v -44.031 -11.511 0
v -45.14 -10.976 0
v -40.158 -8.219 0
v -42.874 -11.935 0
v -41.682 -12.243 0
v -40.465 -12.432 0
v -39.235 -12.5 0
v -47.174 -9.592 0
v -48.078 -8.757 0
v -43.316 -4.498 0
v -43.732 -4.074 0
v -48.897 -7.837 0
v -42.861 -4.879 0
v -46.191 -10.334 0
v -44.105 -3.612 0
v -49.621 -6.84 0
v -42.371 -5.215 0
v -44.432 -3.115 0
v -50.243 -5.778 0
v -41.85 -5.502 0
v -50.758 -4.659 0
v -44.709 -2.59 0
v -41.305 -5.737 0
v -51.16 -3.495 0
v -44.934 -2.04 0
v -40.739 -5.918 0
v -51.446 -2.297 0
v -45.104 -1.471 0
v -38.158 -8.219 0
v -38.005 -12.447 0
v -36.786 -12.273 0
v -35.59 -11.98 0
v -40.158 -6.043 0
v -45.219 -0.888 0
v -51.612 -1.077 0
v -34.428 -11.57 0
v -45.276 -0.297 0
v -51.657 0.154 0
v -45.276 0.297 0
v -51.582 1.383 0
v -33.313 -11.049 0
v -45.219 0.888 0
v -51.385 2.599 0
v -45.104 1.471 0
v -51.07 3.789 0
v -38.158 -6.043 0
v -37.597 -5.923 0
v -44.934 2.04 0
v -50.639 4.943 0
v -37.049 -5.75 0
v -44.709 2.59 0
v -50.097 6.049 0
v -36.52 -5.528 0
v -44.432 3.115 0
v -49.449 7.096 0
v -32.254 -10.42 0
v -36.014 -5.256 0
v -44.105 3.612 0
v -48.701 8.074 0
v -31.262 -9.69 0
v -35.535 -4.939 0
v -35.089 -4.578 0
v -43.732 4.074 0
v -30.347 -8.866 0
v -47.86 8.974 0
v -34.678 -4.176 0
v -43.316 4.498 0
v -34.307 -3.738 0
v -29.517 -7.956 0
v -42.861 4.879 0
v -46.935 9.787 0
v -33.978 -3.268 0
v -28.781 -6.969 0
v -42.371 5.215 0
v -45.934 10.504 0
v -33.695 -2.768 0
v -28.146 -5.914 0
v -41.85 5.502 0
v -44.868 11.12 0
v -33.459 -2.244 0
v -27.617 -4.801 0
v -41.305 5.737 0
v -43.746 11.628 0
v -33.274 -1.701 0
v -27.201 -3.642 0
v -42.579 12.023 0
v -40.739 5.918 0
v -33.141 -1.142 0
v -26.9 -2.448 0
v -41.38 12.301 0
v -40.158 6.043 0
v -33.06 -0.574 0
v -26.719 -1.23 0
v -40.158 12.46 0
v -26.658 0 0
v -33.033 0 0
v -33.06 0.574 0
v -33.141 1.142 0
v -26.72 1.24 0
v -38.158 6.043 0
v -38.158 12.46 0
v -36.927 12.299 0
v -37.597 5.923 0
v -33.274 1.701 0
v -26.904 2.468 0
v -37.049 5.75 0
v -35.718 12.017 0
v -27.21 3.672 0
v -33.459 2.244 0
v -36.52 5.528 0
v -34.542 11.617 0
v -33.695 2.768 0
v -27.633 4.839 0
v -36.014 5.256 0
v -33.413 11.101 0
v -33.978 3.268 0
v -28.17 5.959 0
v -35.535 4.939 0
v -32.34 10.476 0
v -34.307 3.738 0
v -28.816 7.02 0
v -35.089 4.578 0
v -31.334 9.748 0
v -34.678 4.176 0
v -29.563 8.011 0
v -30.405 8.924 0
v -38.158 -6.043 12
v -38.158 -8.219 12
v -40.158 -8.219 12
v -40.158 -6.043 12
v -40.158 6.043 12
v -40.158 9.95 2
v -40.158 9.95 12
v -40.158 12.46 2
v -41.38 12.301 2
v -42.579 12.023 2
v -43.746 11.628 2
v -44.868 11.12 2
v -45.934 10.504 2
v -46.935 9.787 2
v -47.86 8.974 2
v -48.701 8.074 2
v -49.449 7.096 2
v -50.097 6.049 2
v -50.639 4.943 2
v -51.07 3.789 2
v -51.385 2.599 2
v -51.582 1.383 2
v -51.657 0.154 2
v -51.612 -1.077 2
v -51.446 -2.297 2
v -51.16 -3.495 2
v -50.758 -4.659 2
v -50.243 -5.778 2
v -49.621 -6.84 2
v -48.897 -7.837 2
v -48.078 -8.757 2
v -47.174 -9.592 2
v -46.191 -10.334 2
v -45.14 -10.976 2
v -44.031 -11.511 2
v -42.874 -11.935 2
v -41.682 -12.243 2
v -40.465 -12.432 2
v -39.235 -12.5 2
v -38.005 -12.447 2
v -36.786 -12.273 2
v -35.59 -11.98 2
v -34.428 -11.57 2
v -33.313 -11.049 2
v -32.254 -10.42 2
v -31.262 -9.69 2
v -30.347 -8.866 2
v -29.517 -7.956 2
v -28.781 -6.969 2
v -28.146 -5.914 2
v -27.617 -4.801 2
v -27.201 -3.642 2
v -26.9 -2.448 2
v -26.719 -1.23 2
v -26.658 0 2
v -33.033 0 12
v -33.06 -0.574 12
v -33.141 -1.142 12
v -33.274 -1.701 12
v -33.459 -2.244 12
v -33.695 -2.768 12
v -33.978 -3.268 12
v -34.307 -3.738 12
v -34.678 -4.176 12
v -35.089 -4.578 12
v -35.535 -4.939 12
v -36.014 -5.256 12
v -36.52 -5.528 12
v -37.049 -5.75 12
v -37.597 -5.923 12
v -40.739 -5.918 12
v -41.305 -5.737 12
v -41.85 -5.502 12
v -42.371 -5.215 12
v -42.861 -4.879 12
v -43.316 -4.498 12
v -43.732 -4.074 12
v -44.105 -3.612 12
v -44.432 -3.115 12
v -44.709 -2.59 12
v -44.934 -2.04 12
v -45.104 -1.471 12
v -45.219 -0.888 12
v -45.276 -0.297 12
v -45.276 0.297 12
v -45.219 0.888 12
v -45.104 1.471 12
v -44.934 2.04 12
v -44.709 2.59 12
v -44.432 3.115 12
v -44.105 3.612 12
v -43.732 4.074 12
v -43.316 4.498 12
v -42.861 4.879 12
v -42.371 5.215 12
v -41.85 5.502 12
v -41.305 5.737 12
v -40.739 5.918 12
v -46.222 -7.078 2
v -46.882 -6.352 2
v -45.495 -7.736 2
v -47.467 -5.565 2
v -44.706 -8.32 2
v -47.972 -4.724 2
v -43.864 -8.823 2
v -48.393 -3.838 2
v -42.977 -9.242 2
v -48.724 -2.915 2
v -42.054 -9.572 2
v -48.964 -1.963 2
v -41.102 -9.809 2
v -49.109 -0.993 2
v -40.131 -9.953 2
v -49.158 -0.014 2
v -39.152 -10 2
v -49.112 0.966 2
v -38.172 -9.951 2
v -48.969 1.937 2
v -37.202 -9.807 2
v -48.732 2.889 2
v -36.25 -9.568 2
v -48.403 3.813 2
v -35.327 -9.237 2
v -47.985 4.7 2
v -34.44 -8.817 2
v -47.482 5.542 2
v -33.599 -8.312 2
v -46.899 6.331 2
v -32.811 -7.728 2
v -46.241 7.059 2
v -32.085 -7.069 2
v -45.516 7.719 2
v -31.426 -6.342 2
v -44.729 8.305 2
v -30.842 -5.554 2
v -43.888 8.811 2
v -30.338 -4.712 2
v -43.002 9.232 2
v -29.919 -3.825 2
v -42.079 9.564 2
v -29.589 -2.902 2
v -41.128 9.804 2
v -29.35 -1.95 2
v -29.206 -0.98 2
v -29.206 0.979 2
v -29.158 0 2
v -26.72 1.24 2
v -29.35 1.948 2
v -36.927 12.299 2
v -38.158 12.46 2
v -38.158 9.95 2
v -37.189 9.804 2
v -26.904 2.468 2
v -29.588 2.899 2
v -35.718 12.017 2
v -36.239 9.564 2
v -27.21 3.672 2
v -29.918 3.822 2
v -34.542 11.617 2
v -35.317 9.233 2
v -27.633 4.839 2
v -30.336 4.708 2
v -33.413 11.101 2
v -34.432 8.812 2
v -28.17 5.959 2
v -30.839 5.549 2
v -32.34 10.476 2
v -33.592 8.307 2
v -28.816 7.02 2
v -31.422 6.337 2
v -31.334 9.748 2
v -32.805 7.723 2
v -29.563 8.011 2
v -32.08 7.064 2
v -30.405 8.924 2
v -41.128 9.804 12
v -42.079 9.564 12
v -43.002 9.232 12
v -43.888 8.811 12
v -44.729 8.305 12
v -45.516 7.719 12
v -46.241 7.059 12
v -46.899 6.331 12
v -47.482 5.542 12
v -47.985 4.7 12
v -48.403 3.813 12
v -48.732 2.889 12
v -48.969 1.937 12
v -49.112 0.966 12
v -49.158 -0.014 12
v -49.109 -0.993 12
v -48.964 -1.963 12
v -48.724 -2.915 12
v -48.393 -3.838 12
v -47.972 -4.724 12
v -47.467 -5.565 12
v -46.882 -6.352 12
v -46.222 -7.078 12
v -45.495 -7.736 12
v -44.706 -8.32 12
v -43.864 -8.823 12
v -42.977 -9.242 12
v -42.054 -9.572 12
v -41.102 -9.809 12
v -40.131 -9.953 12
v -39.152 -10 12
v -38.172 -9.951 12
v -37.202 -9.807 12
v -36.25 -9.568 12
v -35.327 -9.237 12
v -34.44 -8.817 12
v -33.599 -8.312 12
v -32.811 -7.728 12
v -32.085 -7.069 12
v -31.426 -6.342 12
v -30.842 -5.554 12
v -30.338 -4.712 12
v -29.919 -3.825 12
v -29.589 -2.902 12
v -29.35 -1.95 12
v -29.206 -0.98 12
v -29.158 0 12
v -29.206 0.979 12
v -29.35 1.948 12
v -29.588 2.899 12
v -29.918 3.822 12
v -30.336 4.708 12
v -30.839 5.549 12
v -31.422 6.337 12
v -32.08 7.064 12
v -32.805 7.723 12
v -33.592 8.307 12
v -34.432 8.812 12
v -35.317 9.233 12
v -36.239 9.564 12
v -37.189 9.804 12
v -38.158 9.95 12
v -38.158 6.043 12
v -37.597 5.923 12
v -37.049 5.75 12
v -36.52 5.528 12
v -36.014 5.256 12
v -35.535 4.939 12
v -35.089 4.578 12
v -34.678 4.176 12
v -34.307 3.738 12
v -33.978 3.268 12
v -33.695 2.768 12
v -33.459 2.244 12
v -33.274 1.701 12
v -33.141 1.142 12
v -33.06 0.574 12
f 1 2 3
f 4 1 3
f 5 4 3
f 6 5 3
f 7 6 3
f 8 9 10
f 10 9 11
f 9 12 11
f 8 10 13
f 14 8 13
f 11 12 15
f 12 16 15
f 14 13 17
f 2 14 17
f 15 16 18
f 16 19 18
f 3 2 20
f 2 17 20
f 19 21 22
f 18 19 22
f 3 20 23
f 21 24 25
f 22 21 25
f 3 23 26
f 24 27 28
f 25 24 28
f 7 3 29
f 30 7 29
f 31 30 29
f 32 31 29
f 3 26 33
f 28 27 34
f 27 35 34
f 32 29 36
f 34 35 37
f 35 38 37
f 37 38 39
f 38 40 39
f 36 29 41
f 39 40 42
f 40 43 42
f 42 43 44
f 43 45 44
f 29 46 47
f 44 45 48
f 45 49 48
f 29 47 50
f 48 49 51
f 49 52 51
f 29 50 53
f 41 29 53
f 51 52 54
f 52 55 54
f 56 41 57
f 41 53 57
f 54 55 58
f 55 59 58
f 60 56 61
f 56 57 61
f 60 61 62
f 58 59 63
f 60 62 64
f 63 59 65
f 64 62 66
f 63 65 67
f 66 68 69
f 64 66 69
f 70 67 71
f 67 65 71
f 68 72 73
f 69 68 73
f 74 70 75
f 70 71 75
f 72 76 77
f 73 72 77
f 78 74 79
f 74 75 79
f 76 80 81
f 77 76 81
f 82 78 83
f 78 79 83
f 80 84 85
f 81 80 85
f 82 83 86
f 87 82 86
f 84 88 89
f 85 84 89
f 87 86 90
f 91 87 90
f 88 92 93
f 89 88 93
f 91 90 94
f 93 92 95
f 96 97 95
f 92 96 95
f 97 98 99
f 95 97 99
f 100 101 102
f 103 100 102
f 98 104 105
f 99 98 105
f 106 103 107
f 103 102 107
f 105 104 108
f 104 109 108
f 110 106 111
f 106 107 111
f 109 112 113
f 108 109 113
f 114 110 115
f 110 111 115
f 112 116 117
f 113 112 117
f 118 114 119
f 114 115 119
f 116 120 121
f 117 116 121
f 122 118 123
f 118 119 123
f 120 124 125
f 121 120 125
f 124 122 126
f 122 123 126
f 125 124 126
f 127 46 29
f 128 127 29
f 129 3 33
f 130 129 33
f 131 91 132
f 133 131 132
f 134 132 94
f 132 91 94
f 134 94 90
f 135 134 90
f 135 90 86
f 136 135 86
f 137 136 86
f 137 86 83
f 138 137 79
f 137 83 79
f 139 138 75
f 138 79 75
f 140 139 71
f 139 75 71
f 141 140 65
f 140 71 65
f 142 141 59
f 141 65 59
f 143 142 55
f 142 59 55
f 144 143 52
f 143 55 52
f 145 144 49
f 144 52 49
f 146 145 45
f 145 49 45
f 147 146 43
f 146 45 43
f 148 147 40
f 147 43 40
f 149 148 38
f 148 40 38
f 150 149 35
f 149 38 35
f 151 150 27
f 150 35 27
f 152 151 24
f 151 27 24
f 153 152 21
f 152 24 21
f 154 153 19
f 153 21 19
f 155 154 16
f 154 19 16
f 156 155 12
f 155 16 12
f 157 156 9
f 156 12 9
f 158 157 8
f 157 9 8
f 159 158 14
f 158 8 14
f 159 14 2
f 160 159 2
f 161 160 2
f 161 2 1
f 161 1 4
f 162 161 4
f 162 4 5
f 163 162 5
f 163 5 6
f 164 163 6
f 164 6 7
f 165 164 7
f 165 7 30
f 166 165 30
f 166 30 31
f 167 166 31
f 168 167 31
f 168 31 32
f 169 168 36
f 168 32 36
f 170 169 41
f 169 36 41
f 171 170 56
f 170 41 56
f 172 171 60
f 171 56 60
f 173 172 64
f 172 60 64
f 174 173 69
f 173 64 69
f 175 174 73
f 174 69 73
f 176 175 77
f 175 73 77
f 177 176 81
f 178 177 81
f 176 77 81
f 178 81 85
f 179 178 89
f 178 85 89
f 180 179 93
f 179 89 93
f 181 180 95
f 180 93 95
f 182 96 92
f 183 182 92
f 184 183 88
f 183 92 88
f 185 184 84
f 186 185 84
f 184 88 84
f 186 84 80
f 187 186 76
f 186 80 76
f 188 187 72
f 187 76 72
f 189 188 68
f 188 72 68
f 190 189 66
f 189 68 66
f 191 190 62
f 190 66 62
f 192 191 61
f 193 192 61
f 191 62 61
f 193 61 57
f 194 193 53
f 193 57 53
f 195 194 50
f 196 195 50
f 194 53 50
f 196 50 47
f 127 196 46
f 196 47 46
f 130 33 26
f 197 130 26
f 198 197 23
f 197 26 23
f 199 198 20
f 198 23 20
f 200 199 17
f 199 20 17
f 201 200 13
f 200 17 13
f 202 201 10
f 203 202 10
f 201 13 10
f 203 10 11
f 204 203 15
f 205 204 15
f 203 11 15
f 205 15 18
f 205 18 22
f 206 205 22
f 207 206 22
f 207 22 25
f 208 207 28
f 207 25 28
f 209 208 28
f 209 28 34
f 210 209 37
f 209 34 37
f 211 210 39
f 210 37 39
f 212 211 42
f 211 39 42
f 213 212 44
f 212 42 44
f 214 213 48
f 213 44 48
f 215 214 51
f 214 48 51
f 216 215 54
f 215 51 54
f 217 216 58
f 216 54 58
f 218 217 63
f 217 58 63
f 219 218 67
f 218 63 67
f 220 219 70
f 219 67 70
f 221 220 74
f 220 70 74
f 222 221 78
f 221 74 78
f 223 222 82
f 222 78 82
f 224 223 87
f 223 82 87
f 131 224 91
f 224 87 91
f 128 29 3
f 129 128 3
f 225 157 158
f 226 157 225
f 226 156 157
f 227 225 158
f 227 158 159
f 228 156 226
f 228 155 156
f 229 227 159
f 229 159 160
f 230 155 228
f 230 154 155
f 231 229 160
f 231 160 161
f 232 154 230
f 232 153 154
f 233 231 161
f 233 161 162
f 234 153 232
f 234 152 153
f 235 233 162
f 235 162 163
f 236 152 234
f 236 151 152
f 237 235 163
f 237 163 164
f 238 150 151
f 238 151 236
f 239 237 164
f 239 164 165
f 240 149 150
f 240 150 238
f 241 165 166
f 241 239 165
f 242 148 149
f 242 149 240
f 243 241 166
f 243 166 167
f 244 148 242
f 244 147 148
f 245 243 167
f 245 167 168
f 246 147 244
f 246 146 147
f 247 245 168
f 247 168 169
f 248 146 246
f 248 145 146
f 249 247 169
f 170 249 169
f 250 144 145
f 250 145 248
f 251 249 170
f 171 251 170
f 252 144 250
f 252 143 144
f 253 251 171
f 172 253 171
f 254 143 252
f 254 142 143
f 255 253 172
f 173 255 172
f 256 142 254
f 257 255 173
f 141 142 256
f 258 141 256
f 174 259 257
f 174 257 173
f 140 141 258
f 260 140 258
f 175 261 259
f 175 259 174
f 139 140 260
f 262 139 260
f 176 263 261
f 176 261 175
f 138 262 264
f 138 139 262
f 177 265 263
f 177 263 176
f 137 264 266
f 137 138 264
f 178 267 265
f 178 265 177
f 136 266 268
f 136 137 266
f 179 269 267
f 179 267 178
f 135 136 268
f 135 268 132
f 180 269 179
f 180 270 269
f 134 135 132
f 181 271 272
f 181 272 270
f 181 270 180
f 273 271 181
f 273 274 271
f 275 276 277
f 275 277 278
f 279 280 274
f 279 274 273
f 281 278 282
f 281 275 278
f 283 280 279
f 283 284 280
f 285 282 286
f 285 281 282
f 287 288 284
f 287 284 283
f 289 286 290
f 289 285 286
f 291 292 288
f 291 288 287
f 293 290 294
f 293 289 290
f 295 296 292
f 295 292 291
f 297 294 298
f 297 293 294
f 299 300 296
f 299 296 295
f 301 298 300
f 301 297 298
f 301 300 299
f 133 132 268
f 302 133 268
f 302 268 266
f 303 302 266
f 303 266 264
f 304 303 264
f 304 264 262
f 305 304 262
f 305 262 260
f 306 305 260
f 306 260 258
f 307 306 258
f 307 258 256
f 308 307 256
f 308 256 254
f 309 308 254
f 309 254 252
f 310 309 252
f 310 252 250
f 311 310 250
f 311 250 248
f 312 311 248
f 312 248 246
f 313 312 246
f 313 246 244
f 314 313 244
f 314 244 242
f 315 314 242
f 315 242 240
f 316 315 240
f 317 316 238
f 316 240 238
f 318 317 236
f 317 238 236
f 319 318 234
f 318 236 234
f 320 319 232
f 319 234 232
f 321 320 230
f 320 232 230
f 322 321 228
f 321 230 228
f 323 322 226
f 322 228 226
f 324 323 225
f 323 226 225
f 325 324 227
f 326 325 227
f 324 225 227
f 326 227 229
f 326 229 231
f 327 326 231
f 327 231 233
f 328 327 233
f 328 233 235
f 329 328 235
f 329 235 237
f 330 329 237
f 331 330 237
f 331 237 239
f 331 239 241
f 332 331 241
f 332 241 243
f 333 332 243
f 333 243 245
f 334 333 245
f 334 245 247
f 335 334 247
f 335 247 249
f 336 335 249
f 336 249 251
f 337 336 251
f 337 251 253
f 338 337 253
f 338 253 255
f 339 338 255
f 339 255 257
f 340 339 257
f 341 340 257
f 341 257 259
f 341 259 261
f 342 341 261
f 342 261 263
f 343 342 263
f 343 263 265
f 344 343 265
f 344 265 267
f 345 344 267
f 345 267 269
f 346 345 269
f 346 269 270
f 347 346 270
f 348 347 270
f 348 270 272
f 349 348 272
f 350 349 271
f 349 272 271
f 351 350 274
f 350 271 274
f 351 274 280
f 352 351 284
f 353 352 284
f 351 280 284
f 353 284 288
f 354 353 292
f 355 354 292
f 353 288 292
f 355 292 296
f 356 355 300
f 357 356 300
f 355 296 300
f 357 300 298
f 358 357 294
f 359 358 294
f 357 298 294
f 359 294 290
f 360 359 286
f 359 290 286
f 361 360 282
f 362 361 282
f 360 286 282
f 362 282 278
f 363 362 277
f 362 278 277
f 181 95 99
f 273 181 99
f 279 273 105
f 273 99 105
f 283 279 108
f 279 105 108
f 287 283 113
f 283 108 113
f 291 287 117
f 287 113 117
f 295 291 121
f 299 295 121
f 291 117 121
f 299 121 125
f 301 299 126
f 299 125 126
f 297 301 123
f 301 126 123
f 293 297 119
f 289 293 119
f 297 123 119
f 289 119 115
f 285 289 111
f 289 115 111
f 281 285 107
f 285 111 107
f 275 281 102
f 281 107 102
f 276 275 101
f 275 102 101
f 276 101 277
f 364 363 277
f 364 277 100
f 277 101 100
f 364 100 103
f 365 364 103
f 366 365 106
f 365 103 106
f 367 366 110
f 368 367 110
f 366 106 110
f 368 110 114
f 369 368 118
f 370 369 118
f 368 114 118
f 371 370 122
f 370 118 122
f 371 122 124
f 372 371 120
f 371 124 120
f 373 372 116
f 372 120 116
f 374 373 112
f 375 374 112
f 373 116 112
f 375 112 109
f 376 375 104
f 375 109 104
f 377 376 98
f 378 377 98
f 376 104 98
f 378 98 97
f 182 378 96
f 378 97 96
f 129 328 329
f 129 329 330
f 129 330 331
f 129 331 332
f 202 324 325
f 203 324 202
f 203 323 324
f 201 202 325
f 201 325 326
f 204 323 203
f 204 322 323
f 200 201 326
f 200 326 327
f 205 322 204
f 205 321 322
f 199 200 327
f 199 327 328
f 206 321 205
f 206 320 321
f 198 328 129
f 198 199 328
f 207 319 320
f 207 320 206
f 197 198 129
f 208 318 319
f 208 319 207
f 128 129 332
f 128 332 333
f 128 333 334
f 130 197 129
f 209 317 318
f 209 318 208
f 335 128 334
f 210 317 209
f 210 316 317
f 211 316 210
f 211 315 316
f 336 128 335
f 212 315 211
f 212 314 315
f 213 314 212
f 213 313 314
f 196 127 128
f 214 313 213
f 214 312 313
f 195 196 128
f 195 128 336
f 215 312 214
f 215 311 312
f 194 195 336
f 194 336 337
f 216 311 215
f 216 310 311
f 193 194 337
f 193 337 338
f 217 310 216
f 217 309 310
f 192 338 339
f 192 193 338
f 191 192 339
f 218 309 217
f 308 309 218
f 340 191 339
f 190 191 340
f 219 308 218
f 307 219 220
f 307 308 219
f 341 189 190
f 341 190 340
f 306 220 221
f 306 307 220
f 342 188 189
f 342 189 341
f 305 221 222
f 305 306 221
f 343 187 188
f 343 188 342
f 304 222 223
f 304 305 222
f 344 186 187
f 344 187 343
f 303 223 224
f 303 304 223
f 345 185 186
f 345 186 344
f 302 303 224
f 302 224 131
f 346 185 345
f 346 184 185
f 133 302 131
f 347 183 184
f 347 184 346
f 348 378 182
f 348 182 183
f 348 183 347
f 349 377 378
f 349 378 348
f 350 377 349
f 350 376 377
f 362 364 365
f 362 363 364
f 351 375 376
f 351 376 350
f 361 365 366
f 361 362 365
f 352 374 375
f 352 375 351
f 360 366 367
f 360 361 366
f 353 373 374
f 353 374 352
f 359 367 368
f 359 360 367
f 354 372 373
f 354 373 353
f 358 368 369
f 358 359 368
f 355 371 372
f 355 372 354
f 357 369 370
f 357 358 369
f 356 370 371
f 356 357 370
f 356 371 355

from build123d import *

# Parameters (mm, degrees)
F1_DEPTH = 12
F2_DEPTH = 2


with BuildPart() as f1:
    # F0 (on Top) → F1 (new body)
    with BuildSketch(Plane.XY):
        with BuildLine():
            ThreePointArc((-38.1583740711, 6.0428159826), (-34.4871523359, 3.9617309979), (-33.0333740711, 0))
            ThreePointArc((-33.0333740711, 0), (-34.4871523359, -3.9617309979), (-38.1583740711, -6.0428159826))
            Line((-38.1583740711, -6.0428159826), (-38.1583740711, -6.125))
            Line((-38.1583740711, -6.125), (-38.1583740711, -8.2192253321))
            Line((-38.1583740711, -8.2192253321), (-40.1583740711, -8.2192253321))
            Line((-40.1583740711, -8.2192253321), (-40.1583740711, -6.2192253321))
            Line((-40.1583740711, -6.2192253321), (-40.1583740711, -6.0428159826))
            ThreePointArc((-40.1583740711, -6.0428159826), (-45.2833740711, 0), (-40.1583740711, 6.0428159826))
            Line((-40.1583740711, 6.0428159826), (-40.1583740711, 6.125))
            Line((-40.1583740711, 6.125), (-40.1583740711, 9.9498743711))
            ThreePointArc((-40.1583740711, 9.9498743711), (-45.8665780036, -7.4161984871), (-29.1583740711, 0))
            ThreePointArc((-29.1583740711, 0), (-31.742175584, 6.7082039325), (-38.1583740711, 9.9498743711))
            Line((-38.1583740711, 9.9498743711), (-38.1583740711, 6.125))
            Line((-38.1583740711, 6.125), (-38.1583740711, 6.0428159826))
        make_face()
    extrude(amount=F1_DEPTH)

    # F0 (on Top) → F2 (join)
    with BuildSketch(Plane.XY):
        with BuildLine():
            Line((-38.1583740711, 12.4599357944), (-38.1583740711, 9.9498743711))
            ThreePointArc((-38.1583740711, 9.9498743711), (-31.742175584, 6.7082039325), (-29.1583740711, 0))
            ThreePointArc((-29.1583740711, 0), (-45.8665780036, -7.4161984871), (-40.1583740711, 9.9498743711))
            Line((-40.1583740711, 9.9498743711), (-40.1583740711, 12.4599357944))
            ThreePointArc((-40.1583740711, 12.4599357944), (-47.63628655, -9.1855865354), (-26.6583740711, 0))
            ThreePointArc((-26.6583740711, 0), (-29.9727875357, 8.4779124789), (-38.1583740711, 12.4599357944))
        make_face()
    extrude(amount=F2_DEPTH)


solid = f1.part
